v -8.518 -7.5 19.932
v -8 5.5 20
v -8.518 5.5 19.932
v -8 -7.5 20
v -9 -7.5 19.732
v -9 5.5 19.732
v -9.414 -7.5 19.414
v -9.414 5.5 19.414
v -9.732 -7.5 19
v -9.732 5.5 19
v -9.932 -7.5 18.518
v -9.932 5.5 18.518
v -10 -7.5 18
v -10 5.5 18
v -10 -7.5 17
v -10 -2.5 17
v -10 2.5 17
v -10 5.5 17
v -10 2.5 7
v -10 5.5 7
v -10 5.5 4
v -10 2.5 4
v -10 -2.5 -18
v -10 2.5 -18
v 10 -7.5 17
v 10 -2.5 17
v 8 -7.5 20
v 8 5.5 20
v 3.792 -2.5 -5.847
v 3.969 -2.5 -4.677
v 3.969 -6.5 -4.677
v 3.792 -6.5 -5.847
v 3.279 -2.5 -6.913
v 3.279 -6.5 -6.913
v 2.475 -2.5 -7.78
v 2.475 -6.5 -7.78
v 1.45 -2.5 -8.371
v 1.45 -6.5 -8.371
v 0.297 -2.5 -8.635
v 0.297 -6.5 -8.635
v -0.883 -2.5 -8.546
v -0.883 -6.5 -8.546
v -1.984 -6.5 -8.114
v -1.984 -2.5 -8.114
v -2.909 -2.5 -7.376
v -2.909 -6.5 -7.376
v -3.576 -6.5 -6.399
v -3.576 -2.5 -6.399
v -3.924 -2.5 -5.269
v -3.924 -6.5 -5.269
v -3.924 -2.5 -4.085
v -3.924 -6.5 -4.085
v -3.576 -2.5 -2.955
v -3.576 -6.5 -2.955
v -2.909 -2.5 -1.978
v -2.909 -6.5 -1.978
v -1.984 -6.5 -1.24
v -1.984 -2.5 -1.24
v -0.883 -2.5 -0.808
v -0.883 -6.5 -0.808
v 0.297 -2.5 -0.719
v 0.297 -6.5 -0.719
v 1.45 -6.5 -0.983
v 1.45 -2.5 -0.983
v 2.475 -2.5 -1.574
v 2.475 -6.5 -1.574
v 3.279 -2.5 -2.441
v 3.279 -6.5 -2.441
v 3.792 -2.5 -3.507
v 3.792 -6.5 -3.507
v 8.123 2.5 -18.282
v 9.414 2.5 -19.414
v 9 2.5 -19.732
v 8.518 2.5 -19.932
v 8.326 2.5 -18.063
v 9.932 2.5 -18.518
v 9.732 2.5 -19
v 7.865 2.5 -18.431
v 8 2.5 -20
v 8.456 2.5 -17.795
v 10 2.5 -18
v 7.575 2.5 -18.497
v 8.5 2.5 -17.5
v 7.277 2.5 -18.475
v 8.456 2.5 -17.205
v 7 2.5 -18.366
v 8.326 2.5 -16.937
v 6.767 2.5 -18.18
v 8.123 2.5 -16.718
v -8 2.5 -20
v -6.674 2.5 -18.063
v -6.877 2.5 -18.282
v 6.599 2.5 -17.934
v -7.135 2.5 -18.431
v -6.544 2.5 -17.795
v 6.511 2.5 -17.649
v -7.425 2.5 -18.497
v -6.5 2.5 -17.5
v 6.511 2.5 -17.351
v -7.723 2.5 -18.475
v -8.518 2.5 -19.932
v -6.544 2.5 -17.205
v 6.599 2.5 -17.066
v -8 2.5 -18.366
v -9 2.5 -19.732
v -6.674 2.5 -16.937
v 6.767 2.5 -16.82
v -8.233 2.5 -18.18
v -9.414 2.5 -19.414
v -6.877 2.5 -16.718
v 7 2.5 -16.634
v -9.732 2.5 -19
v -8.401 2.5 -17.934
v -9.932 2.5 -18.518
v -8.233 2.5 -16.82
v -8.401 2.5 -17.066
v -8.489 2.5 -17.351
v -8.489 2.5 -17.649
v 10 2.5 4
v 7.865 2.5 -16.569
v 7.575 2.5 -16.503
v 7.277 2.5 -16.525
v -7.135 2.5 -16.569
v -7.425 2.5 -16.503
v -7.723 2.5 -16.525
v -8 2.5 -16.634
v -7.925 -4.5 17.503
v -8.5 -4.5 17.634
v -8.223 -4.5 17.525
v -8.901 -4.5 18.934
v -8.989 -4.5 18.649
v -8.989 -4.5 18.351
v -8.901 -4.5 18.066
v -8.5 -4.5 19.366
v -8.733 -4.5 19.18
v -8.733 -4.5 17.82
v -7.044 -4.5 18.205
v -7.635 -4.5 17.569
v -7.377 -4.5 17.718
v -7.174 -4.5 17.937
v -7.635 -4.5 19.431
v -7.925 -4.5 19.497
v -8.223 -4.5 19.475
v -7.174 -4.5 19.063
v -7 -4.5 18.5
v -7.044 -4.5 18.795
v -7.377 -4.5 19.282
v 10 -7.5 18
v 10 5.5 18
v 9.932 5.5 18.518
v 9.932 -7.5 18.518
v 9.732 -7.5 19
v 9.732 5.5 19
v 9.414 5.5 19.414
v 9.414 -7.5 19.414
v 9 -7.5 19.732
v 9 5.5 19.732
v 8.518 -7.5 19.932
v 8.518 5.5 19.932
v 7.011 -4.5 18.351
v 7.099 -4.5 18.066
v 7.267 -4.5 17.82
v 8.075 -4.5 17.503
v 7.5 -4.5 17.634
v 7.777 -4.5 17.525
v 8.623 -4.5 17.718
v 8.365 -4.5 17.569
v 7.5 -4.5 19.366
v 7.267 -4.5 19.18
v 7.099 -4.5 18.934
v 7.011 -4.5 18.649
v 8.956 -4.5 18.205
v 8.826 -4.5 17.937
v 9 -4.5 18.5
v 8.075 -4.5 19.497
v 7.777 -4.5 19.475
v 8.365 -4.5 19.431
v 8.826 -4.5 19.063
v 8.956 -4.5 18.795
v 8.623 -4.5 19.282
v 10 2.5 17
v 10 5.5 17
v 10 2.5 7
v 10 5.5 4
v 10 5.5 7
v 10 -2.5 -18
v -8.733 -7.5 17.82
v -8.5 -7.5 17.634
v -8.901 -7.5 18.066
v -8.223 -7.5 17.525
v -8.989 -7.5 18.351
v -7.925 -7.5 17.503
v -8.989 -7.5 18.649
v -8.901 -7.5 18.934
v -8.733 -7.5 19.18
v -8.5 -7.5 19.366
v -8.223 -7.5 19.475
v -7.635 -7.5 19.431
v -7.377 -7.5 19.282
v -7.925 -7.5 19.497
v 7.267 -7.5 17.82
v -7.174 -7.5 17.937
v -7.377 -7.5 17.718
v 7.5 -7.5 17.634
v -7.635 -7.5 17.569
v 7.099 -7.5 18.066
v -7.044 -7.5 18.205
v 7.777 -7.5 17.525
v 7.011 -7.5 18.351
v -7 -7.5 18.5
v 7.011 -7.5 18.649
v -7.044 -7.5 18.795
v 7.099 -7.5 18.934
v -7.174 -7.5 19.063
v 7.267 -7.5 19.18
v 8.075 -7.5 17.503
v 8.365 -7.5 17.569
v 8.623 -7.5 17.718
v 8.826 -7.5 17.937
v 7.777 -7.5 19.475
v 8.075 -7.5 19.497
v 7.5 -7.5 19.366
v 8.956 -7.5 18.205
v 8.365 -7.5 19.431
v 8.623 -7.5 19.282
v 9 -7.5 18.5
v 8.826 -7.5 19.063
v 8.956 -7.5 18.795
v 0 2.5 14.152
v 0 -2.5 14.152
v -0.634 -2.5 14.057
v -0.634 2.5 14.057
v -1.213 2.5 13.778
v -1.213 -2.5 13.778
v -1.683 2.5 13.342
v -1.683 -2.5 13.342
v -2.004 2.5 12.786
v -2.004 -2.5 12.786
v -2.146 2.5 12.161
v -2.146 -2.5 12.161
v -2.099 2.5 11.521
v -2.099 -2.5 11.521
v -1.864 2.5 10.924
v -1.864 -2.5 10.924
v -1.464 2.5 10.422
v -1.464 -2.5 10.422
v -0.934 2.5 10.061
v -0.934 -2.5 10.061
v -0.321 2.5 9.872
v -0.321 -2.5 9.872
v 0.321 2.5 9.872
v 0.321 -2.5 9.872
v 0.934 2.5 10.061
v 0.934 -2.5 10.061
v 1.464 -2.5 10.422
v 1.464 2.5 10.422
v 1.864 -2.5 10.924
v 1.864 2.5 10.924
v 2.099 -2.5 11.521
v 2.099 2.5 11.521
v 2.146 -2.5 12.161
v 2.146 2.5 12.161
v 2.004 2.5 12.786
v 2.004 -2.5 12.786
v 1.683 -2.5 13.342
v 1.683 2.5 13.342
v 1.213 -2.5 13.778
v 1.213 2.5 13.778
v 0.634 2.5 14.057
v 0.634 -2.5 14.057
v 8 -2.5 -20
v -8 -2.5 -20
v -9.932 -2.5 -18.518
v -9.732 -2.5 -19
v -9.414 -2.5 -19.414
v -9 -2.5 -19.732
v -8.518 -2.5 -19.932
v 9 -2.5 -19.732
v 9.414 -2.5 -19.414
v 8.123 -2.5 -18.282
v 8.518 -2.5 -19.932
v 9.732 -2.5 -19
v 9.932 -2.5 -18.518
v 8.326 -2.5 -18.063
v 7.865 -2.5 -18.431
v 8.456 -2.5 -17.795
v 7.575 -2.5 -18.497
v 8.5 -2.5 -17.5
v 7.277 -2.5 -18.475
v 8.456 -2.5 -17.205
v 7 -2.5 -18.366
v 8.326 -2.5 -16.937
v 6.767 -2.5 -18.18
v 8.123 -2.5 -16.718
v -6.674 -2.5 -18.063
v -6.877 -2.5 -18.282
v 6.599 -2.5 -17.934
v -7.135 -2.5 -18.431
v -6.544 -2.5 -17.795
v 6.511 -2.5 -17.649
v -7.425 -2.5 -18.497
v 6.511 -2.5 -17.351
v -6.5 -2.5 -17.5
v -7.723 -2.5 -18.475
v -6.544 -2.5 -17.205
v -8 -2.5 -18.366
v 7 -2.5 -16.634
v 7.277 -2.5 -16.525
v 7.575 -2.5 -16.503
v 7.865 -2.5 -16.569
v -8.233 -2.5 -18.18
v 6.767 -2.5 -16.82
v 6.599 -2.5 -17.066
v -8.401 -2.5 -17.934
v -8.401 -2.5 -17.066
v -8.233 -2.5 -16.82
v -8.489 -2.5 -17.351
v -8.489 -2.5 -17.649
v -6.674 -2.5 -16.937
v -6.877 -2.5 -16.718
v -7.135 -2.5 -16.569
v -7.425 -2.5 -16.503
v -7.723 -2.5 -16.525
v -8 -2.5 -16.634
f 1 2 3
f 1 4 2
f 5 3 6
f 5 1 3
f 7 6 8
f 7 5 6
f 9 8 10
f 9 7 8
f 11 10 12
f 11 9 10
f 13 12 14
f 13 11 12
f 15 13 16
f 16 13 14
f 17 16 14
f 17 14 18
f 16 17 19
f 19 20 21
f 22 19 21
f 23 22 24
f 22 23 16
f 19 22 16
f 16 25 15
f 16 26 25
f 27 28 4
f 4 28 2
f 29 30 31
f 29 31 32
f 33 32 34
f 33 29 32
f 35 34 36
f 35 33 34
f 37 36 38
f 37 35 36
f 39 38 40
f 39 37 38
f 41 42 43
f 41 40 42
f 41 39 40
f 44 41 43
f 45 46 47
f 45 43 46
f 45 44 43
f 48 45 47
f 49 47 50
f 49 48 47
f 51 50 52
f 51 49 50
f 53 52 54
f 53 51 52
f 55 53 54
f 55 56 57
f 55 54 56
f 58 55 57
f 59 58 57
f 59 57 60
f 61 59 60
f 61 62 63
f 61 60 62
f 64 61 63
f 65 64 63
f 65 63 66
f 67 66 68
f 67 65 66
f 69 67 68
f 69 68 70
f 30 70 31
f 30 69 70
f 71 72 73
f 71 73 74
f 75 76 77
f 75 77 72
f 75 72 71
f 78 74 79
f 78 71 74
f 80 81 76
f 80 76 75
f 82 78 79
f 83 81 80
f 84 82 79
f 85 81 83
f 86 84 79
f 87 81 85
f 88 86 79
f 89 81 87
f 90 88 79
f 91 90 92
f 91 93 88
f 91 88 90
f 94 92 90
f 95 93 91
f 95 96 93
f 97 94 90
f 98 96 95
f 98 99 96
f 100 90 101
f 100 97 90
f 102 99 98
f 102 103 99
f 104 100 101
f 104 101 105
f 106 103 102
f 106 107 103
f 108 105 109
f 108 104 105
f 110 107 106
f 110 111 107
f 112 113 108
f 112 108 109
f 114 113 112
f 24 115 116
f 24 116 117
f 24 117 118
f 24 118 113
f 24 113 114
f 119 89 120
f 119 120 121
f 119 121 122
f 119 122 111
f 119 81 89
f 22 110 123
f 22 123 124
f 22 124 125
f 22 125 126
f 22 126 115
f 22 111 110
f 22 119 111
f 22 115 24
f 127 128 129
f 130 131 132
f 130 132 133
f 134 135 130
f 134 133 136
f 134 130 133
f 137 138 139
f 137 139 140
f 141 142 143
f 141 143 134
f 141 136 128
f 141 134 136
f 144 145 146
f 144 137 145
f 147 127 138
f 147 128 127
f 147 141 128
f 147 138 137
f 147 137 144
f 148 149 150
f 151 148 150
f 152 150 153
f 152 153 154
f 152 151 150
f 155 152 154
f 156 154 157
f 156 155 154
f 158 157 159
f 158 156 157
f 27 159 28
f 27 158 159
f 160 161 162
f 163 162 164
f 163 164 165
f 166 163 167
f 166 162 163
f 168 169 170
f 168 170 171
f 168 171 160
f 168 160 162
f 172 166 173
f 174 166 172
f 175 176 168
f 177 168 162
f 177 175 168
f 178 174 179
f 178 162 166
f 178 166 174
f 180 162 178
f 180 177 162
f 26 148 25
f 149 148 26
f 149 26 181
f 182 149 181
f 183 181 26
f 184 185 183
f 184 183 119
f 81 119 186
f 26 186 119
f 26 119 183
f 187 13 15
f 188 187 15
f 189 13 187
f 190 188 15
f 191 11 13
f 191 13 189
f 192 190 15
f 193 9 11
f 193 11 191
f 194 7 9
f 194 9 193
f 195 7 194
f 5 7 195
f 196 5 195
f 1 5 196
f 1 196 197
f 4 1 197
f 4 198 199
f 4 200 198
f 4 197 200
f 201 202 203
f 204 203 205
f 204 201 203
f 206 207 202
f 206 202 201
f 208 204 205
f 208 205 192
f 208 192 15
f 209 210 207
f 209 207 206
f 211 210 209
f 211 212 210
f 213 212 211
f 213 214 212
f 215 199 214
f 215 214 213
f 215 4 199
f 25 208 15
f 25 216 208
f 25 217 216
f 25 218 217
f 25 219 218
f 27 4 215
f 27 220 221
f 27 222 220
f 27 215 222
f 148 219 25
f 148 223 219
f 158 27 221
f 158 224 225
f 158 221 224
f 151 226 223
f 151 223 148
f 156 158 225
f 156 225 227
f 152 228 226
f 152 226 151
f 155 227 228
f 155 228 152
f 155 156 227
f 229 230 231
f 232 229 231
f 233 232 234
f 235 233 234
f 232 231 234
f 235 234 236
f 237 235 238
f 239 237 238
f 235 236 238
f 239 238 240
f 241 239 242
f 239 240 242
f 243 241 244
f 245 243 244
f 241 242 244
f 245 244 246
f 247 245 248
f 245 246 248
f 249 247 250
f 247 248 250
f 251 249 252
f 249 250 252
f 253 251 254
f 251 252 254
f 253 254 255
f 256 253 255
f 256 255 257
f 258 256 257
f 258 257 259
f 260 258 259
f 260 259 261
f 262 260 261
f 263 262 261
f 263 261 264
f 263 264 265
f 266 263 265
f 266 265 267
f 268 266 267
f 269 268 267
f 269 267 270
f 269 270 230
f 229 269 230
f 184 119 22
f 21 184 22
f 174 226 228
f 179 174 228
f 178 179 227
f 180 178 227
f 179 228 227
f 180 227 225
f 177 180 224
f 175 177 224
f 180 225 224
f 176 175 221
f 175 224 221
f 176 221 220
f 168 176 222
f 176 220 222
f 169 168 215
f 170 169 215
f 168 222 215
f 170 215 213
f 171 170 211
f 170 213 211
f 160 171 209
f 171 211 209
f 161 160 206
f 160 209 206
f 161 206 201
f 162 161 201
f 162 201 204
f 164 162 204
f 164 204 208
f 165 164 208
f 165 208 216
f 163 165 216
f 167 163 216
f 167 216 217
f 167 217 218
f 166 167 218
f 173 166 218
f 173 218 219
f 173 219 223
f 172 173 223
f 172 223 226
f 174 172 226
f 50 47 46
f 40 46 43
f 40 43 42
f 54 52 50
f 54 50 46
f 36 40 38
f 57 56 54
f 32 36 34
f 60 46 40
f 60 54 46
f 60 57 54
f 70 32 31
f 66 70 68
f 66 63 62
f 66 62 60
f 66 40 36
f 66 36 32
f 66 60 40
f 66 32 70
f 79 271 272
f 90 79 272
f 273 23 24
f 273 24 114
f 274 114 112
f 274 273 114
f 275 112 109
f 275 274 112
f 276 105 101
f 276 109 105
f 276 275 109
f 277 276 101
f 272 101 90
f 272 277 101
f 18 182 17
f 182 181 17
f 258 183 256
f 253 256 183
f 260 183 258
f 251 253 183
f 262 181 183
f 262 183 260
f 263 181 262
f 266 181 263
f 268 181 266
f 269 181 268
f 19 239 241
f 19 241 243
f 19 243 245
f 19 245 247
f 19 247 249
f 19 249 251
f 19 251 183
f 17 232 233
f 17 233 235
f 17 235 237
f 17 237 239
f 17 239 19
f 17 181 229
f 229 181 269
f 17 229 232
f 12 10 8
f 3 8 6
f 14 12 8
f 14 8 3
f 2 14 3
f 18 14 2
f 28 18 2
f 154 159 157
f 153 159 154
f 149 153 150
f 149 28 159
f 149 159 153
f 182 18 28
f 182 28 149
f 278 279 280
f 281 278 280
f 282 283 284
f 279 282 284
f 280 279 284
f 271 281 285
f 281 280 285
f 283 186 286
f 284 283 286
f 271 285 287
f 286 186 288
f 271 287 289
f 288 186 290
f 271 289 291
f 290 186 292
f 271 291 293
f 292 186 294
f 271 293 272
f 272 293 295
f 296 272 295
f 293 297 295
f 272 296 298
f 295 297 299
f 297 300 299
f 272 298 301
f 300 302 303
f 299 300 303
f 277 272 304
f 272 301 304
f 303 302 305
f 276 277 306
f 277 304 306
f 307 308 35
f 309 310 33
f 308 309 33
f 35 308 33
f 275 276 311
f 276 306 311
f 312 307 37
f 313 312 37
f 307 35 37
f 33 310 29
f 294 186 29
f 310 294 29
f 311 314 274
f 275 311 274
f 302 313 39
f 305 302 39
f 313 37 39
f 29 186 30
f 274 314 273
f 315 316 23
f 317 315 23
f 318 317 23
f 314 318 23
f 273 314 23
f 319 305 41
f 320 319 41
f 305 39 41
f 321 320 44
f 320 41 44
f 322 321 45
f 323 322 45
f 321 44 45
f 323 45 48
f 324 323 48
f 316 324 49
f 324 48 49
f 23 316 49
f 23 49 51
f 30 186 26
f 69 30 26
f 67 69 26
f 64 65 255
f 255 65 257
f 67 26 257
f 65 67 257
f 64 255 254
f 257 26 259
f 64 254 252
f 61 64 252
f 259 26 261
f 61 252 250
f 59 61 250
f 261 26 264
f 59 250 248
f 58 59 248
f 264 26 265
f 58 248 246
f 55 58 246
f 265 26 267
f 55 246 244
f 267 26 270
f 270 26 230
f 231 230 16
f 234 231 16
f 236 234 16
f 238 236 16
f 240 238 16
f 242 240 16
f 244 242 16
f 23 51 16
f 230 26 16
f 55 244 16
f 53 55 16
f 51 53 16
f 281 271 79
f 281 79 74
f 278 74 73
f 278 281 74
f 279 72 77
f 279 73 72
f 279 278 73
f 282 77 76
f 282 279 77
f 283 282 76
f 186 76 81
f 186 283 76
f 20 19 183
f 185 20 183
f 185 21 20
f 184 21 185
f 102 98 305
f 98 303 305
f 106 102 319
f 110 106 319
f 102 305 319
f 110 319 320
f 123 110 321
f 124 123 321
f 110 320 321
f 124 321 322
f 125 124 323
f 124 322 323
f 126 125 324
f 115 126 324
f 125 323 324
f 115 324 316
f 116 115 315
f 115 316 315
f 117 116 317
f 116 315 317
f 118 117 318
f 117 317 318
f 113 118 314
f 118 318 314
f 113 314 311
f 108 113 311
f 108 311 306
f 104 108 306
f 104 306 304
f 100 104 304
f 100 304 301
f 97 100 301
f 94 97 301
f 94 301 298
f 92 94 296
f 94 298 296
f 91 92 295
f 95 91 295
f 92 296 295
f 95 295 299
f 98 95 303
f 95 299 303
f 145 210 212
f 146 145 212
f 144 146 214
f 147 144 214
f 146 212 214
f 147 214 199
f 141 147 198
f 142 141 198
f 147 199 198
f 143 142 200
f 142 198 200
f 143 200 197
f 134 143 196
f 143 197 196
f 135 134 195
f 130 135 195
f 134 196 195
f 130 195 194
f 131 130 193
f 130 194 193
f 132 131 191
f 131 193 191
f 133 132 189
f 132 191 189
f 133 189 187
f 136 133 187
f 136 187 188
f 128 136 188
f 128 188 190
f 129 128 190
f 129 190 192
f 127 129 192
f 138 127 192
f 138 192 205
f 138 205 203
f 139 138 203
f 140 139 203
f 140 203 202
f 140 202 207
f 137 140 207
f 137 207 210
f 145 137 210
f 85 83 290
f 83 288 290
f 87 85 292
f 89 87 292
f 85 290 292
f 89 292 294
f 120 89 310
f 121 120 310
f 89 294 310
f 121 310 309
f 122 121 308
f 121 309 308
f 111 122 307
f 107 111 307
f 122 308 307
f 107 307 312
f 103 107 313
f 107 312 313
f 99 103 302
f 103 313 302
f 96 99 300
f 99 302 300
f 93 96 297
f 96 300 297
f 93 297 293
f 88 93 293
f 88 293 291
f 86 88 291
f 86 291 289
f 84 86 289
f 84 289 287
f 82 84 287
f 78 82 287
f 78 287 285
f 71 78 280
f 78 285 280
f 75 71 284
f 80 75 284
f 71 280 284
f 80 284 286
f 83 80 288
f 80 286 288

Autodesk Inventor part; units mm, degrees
ref_plane "YZ Plane" through (0, 0, 0) normal (1, 0, 0) x (0, 1, 0)
ref_plane "XZ Plane" through (0, 0, 0) normal (0, 1, 0) x (-1, 0, 0)
ref_plane "XY Plane" through (0, 0, 0) normal (0, 0, 1) x (1, 0, 0)
sketch "Sketch1" plane through (0, 0, 0) normal (0, 1, 0) x (-1, 0, 0)
  line L0 (10, 20) -> (-10, 20)
  line L1 (-10, 20) -> (-10, -20)
  line L2 (-10, -20) -> (10, -20)
  line L3 (10, -20) -> (10, 20)
  line L4 (10, 20) -> (-10, -20) construction
  line L5 (-10, 20) -> (10, -20) construction
  point P0 (0, 0)
  dimension "d2" = 20
  dimension "d3" = 40
extrude "Extrusion1" add sketch "Sketch1" along normal mid plane 5
sketch "Sketch2" plane through (0, 2.5, 0) normal (0, 1, 0) x (1, 0, 0)
  line L0 (10, -4) -> (-10, -4)
  line L1 (-10, -4) -> (-10, -7)
  line L2 (-10, -7) -> (10, -7)
  line L3 (10, -7) -> (10, -4)
  line L4 (10, -17) -> (-10, -17)
  line L5 (-10, -17) -> (-10, -20)
  line L6 (-10, -20) -> (10, -20)
  line L7 (10, -20) -> (10, -17)
  line L8 (10, -20) -> (10, 20) projected
  line L9 (-10, 20) -> (-10, -20) projected
  line L10 (10, 20) -> (-10, 20) projected
  line L11 (-10, -20) -> (10, -20) projected
  point P0 (0, 0)
  dimension "d4" = 3
  dimension "d5" = 3
  dimension "d6" = 10
extrude "Extrusion2" add sketch "Sketch2" along normal blind 3 contours L3 L2 L1 L0 | L7 L6 L5 L4
sketch "Sketch3" plane through (0, 2.5, 0) normal (0, 1, 0) x (1, 0, 0)
  line L0 (10, -7) -> (-10, -7) projected
  line L1 (-10, -7) -> (-10, -17) projected
  line L2 (-10, -17) -> (10, -17) projected
  line L3 (10, -17) -> (10, -7) projected
  line L4 (10, -17) -> (-10, -17) projected
  point P0 (0, 0)
  point P1 (0, -12)
  point P2 (-10, -12)
  point P3 (0, -17)
hole "Hole1" at (0, 2.5, 12) direction (0, -1, 0) diameter 4.305 end through all clearance for "Flat Head Machine Screw (82)" size "#6" standard "Ansi Unified Screw Threads"
sketch "Sketch4" plane through (0, -2.5, 0) normal (0, -1, 0) x (1, 0, 0)
  circle A0 centre (0, -4.677) radius 3.9688
  circle A1 centre (0, 12) radius 2.1525 projected
  point P0 (0, 0)
  dimension "d16" = 7.9375
  dimension "d17" = 16.677
extrude "Extrusion3" add sketch "Sketch4" along normal blind 4 contours A0
sketch "Sketch6" plane through (0, -2.5, 0) normal (0, -1, 0) x (1, 0, 0)
  circle A0 centre (7.5, -17.5) radius 1
  circle A1 centre (-7.5, -17.5) radius 1
  line L0 (-10, -20) -> (10, -20) projected
  line L1 (10, -20) -> (10, 20) projected
  line L2 (-10, 20) -> (-10, -20) projected
  point P0 (0, 0)
  point P1 (-8, -17.5)
  point P2 (8, -17.5)
  point P3 (10, -15.5)
  point P4 (10, 15.5)
  point P5 (-10, 15.5)
  point P6 (-10, -15.5)
  dimension "d28" = 2
  dimension "d29" = 2
  dimension "d30" = 2.5
  dimension "d31" = 2.5
  dimension "d32" = 2.5
extrude "Extrusion5" cut sketch "Sketch6" against normal through all
sketch "Sketch8" plane through (0, -2.5, 0) normal (0, -1, 0) x (1, 0, 0)
  line L0 (10, 20) -> (10, 17) projected
  line L1 (10, 17) -> (-10, 17) projected
  line L2 (10, 20) -> (-10, 20)
  line L3 (-10, 20) -> (-10, 17)
  line L4 (-10, 17) -> (10, 17)
  line L5 (10, 17) -> (10, 20)
  point P0 (0, 0)
extrude "Extrusion6" add sketch "Sketch8" along normal blind 5
sketch "Sketch9" plane through (0, -7.5, 0) normal (0, -1, 0) x (1, 0, 0)
  circle A0 centre (8, 18.5) radius 1
  circle A1 centre (-8, 18.5) radius 1
  line L0 (10, 17) -> (10, 20) projected
  line L1 (10, 20) -> (-10, 20) projected
  line L2 (-10, 20) -> (-10, 17) projected
  point P0 (0, 0)
  dimension "d38" = 2
  dimension "d39" = 2
  dimension "d40" = 2
  dimension "d41" = 1.5
  dimension "d42" = 2
extrude "Extrusion7" cut sketch "Sketch9" against normal blind 3
fillet "Fillet2" radius 2 4 edges at (-10, -1, 20) (-10, 0, -20) (10, 0, -20) (10, -1, 20)
equation "\"d5\" = d4"
equation "\"d31\" = d30"
equation "\"d32\" = d30"
equation "\"d42\" = d40"
properties part number "PinionHolder"
